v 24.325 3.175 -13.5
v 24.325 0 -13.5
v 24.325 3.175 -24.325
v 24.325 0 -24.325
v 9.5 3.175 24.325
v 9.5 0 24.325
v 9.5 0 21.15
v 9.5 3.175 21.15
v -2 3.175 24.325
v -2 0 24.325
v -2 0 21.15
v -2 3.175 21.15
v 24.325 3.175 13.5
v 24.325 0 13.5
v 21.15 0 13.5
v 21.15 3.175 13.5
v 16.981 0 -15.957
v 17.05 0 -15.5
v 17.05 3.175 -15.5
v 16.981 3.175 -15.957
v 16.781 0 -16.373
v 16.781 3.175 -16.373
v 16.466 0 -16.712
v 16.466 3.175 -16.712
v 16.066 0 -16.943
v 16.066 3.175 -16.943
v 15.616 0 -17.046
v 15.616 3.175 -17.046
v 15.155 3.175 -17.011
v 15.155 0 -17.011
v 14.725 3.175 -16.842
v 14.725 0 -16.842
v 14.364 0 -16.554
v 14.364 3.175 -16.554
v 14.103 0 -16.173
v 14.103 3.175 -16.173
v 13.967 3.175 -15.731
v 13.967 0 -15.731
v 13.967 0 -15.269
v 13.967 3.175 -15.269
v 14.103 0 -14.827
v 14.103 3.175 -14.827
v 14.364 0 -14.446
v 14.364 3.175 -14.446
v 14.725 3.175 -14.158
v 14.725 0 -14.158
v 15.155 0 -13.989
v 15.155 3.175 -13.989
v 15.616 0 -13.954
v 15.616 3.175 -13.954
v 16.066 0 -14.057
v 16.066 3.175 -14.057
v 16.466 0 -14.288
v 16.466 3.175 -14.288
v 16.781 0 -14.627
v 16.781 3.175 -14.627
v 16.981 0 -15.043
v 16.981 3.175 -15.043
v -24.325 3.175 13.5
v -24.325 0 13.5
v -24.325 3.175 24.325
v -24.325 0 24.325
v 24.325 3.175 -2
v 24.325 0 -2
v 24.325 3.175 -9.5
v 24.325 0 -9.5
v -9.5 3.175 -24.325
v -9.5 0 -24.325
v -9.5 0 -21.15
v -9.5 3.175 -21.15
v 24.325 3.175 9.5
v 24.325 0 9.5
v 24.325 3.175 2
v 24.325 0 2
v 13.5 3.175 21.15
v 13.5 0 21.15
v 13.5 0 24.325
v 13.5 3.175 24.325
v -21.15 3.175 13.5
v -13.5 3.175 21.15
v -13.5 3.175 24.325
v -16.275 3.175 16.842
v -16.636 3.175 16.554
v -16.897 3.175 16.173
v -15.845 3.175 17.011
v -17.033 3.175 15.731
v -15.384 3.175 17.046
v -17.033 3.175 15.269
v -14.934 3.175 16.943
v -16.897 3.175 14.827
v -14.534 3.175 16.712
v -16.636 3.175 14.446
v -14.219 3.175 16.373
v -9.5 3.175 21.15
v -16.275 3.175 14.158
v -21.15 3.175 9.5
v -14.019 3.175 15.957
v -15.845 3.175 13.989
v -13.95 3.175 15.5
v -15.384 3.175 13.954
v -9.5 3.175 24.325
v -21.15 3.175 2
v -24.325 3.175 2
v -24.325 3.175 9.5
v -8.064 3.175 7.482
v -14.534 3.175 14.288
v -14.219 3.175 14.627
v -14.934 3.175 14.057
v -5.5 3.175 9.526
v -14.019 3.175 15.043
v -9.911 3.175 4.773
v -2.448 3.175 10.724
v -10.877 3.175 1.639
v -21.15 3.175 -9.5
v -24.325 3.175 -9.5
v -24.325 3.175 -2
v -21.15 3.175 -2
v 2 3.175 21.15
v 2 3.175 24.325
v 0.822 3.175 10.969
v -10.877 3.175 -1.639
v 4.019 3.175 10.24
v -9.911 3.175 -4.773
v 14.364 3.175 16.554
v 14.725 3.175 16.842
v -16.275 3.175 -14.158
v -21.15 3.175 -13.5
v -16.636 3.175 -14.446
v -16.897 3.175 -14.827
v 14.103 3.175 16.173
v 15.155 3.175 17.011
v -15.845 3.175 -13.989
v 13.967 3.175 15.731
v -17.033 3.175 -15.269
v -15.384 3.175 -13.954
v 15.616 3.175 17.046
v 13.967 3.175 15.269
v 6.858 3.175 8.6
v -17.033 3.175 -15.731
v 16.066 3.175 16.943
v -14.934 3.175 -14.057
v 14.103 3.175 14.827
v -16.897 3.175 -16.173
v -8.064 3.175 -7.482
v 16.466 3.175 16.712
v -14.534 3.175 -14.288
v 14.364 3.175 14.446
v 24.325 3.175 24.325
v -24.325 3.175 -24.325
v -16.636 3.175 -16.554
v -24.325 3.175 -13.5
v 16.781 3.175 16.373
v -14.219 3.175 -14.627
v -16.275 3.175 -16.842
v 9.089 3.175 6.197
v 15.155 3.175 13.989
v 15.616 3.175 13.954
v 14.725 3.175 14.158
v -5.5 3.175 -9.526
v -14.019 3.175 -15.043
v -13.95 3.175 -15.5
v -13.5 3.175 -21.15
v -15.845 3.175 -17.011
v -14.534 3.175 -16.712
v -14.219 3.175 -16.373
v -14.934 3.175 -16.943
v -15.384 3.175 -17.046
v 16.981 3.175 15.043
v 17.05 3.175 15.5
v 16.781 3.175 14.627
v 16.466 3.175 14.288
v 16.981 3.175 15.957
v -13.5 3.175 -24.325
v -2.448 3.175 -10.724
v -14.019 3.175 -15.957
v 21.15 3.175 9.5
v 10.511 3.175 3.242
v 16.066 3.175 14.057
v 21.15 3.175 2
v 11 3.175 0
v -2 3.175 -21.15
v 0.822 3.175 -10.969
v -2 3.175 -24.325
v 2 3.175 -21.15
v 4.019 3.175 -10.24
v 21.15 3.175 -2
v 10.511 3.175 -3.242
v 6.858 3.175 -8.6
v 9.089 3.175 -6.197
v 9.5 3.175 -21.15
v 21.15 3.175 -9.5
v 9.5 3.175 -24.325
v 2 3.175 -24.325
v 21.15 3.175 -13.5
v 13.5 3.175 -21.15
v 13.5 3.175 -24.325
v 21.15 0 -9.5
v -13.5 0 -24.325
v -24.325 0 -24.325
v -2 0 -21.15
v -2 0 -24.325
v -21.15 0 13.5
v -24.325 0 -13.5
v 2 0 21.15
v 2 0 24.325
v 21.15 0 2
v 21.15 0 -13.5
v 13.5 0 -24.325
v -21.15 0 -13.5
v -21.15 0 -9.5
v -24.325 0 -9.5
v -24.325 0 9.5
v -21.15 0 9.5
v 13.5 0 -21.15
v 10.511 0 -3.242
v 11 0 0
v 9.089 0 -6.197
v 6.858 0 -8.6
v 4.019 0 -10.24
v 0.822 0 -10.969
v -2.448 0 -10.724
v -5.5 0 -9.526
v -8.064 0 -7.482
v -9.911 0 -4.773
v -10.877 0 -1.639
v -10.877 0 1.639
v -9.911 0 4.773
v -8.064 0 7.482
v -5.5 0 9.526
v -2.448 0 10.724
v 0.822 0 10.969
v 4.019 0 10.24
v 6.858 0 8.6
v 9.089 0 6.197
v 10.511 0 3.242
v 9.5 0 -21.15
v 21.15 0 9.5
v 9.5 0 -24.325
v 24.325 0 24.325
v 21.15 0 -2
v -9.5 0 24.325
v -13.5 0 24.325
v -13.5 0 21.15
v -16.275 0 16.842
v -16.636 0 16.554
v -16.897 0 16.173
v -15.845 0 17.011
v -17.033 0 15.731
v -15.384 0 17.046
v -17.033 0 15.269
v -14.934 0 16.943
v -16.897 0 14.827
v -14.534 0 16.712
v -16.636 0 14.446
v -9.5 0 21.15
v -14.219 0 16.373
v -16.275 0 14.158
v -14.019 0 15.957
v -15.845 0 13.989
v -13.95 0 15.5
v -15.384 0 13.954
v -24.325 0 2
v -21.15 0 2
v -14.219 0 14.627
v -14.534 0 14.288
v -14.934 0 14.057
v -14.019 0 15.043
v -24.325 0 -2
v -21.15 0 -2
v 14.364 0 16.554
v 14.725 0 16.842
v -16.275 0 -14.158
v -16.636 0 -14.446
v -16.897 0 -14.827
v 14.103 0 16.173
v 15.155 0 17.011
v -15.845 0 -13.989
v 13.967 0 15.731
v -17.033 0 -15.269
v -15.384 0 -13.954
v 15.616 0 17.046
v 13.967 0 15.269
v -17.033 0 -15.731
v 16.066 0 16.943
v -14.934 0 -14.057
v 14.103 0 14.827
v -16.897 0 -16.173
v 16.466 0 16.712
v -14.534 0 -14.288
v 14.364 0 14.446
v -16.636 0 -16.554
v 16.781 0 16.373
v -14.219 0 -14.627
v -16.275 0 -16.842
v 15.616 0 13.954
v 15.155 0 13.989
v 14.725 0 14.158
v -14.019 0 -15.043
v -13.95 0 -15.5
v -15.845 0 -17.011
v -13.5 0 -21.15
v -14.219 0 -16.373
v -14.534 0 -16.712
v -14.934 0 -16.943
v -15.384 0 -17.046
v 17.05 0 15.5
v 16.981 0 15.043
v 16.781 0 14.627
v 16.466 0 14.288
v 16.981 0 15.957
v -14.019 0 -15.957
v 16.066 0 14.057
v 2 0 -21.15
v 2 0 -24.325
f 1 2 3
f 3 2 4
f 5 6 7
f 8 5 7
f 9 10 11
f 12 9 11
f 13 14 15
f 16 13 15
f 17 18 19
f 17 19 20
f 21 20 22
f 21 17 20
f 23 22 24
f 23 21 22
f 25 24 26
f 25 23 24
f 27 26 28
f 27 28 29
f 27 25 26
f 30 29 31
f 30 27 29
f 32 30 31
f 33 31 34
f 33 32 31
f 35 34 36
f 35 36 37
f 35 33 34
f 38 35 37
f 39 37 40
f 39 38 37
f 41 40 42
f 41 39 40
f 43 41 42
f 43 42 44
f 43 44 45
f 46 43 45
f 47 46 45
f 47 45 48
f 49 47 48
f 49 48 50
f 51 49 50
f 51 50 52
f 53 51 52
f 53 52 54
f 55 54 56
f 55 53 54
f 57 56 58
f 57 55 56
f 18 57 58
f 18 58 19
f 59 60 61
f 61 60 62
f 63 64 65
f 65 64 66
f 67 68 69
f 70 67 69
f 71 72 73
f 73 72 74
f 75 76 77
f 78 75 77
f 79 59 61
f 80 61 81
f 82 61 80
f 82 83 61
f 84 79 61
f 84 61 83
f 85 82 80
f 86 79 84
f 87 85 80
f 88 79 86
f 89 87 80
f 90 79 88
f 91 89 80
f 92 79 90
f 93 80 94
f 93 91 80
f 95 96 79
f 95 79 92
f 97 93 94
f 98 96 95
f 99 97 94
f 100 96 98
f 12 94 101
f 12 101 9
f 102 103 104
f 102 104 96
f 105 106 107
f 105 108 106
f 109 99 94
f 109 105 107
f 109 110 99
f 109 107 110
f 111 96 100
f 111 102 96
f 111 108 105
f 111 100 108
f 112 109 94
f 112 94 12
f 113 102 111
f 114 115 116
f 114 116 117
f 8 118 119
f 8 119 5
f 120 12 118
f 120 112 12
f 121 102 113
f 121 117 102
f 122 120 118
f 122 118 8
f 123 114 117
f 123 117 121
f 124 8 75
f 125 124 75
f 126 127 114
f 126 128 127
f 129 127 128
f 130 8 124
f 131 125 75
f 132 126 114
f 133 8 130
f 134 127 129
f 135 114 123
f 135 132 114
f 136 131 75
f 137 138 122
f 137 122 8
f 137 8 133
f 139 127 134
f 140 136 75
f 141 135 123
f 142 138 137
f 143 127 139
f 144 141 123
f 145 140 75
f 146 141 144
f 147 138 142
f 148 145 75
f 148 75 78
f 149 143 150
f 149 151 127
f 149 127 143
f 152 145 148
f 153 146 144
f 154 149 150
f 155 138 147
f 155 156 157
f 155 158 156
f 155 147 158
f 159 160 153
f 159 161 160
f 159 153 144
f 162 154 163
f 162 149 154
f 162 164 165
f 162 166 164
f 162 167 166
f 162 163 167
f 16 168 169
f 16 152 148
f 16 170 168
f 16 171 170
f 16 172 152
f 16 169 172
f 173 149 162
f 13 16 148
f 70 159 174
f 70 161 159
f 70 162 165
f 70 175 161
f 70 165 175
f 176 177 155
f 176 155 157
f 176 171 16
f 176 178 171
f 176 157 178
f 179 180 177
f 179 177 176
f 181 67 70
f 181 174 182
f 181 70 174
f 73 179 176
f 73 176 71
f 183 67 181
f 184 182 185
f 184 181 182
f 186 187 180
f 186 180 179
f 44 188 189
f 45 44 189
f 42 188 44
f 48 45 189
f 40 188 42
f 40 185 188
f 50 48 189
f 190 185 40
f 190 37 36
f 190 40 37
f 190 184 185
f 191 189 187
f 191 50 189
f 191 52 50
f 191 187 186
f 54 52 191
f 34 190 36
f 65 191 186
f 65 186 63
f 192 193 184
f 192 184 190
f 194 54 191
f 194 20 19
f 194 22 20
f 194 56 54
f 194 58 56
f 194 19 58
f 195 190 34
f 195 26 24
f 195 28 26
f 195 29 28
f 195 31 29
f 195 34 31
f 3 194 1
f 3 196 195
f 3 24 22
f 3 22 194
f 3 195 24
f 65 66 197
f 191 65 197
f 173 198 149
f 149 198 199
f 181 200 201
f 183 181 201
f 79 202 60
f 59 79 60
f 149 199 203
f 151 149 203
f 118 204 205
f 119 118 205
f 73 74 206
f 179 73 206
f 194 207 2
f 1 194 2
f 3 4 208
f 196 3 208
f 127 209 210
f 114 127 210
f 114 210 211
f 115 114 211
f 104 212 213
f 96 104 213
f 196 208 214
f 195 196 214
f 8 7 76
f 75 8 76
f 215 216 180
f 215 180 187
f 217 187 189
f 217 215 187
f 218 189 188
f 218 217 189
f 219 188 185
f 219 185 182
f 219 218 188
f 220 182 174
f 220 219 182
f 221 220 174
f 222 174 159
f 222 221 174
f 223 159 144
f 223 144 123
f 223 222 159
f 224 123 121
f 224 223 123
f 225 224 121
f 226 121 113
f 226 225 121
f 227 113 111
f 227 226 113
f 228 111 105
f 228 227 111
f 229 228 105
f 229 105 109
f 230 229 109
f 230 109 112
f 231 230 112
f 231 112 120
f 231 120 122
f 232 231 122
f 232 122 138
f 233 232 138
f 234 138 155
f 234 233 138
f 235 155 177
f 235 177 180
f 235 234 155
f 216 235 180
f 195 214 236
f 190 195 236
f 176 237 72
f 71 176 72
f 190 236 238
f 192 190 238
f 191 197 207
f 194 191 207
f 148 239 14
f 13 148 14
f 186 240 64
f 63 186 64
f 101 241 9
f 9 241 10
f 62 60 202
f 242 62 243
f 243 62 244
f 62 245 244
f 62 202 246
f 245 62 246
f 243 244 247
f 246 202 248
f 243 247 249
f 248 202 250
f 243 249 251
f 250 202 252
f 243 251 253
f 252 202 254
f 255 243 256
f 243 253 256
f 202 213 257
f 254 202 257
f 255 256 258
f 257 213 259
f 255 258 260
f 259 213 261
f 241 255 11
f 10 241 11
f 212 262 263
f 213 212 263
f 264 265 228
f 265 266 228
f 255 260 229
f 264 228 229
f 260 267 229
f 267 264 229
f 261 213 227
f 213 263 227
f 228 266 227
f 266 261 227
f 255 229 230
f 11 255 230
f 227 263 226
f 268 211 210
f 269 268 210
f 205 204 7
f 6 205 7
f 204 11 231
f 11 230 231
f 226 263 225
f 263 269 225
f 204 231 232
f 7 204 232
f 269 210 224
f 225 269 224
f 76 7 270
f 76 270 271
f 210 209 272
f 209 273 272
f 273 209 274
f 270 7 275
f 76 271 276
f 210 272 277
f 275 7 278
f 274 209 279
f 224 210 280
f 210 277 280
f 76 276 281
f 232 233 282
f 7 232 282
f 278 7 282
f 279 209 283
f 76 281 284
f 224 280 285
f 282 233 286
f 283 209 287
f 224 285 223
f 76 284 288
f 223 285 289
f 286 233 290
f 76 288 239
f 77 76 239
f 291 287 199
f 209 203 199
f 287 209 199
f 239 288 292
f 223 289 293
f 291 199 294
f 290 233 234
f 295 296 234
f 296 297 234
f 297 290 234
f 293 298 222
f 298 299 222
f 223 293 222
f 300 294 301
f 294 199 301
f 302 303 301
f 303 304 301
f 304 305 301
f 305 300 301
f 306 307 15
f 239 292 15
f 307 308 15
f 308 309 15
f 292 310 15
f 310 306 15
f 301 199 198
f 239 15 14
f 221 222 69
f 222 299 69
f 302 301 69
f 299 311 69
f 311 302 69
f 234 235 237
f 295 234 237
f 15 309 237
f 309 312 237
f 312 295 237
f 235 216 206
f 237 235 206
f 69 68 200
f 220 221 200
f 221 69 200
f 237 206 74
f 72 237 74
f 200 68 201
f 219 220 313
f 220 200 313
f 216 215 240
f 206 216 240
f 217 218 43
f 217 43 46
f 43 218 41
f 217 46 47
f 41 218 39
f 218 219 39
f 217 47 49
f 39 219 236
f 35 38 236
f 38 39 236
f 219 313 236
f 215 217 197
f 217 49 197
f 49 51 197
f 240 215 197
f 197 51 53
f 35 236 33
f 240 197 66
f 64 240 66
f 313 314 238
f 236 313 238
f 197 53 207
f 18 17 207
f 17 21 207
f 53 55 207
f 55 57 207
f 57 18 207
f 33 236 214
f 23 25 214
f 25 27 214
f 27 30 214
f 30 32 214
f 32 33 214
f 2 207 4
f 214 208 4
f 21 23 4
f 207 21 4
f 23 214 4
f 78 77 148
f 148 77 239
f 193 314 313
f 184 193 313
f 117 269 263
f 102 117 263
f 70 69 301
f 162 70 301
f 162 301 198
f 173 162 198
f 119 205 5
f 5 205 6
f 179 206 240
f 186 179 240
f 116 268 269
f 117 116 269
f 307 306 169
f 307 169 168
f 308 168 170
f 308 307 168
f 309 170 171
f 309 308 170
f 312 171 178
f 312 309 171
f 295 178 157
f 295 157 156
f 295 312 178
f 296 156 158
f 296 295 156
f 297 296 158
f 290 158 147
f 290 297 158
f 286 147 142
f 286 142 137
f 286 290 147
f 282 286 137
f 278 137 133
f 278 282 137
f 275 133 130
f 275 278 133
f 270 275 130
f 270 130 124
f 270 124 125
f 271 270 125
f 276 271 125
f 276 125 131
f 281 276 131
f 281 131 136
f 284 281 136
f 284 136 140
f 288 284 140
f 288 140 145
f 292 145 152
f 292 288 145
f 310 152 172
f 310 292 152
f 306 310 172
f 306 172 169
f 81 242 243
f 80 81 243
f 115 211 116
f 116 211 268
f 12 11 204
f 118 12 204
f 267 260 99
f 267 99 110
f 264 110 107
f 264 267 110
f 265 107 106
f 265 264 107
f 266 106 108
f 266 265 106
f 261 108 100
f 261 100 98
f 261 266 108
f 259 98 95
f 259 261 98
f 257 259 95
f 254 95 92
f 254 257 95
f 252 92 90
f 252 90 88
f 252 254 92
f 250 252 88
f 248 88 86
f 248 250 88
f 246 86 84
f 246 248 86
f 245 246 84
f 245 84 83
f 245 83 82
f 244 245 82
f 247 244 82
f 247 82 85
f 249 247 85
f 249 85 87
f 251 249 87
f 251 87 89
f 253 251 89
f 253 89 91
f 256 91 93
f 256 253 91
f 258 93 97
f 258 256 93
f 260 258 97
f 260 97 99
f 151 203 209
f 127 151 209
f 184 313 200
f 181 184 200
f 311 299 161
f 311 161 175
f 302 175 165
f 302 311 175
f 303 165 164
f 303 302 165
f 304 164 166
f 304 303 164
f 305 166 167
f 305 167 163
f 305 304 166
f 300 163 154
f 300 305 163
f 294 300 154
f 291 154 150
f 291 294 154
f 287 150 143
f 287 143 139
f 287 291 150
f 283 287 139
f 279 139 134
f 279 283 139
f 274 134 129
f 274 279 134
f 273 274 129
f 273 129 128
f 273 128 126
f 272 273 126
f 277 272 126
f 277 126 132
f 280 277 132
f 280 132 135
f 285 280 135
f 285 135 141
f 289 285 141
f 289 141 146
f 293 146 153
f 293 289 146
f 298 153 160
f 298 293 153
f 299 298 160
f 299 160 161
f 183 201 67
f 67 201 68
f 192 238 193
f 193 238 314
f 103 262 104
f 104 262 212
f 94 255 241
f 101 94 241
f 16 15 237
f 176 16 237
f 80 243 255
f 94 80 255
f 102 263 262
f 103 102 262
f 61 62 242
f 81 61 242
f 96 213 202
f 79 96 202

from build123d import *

# Parameters (mm, degrees)
SKETCH2_R           = 1.55
SKETCH2_R_2         = 11
BOSS_EXTRUDE1_DEPTH = 3.175


with BuildPart() as part:
    # Sketch2 → Boss-Extrude1 (new body)
    with BuildSketch(Plane(origin=(0, 0, 0), x_dir=(1, 0, 0), z_dir=(0, 1, 0))):
        Polygon((24.325, 2), (24.325, 9.5), (21.15, 9.5), (21.15, 13.5), (24.325, 13.5), (24.325, 24.325), (13.5, 24.325), (13.5, 21.15), (9.5, 21.15), (9.5, 24.325), (2, 24.325), (2, 21.15), (-2, 21.15), (-2, 24.325), (-9.5, 24.325), (-9.5, 21.15), (-13.5, 21.15), (-13.5, 24.325), (-24.325, 24.325), (-24.325, 13.5), (-21.15, 13.5), (-21.15, 9.5), (-24.325, 9.5), (-24.325, 2), (-21.15, 2), (-21.15, -2), (-24.325, -2), (-24.325, -9.5), (-21.15, -9.5), (-21.15, -13.5), (-24.325, -13.5), (-24.325, -24.325), (-13.5, -24.325), (-13.5, -21.15), (-9.5, -21.15), (-9.5, -24.325), (-2, -24.325), (-2, -21.15), (2, -21.15), (2, -24.325), (9.5, -24.325), (9.5, -21.15), (13.5, -21.15), (13.5, -24.325), (24.325, -24.325), (24.325, -13.5), (21.15, -13.5), (21.15, -9.5), (24.325, -9.5), (24.325, -2), (21.15, -2), (21.15, 2), align=None)
        with Locations((-15.5, -15.5)):
            Circle(SKETCH2_R, mode=Mode.SUBTRACT)
        with Locations((15.5, -15.5)):
            Circle(SKETCH2_R, mode=Mode.SUBTRACT)
        Circle(SKETCH2_R_2, mode=Mode.SUBTRACT)
        with Locations((-15.5, 15.5)):
            Circle(SKETCH2_R, mode=Mode.SUBTRACT)
        with Locations((15.5, 15.5)):
            Circle(SKETCH2_R, mode=Mode.SUBTRACT)
    extrude(amount=BOSS_EXTRUDE1_DEPTH)


solid = part.part
